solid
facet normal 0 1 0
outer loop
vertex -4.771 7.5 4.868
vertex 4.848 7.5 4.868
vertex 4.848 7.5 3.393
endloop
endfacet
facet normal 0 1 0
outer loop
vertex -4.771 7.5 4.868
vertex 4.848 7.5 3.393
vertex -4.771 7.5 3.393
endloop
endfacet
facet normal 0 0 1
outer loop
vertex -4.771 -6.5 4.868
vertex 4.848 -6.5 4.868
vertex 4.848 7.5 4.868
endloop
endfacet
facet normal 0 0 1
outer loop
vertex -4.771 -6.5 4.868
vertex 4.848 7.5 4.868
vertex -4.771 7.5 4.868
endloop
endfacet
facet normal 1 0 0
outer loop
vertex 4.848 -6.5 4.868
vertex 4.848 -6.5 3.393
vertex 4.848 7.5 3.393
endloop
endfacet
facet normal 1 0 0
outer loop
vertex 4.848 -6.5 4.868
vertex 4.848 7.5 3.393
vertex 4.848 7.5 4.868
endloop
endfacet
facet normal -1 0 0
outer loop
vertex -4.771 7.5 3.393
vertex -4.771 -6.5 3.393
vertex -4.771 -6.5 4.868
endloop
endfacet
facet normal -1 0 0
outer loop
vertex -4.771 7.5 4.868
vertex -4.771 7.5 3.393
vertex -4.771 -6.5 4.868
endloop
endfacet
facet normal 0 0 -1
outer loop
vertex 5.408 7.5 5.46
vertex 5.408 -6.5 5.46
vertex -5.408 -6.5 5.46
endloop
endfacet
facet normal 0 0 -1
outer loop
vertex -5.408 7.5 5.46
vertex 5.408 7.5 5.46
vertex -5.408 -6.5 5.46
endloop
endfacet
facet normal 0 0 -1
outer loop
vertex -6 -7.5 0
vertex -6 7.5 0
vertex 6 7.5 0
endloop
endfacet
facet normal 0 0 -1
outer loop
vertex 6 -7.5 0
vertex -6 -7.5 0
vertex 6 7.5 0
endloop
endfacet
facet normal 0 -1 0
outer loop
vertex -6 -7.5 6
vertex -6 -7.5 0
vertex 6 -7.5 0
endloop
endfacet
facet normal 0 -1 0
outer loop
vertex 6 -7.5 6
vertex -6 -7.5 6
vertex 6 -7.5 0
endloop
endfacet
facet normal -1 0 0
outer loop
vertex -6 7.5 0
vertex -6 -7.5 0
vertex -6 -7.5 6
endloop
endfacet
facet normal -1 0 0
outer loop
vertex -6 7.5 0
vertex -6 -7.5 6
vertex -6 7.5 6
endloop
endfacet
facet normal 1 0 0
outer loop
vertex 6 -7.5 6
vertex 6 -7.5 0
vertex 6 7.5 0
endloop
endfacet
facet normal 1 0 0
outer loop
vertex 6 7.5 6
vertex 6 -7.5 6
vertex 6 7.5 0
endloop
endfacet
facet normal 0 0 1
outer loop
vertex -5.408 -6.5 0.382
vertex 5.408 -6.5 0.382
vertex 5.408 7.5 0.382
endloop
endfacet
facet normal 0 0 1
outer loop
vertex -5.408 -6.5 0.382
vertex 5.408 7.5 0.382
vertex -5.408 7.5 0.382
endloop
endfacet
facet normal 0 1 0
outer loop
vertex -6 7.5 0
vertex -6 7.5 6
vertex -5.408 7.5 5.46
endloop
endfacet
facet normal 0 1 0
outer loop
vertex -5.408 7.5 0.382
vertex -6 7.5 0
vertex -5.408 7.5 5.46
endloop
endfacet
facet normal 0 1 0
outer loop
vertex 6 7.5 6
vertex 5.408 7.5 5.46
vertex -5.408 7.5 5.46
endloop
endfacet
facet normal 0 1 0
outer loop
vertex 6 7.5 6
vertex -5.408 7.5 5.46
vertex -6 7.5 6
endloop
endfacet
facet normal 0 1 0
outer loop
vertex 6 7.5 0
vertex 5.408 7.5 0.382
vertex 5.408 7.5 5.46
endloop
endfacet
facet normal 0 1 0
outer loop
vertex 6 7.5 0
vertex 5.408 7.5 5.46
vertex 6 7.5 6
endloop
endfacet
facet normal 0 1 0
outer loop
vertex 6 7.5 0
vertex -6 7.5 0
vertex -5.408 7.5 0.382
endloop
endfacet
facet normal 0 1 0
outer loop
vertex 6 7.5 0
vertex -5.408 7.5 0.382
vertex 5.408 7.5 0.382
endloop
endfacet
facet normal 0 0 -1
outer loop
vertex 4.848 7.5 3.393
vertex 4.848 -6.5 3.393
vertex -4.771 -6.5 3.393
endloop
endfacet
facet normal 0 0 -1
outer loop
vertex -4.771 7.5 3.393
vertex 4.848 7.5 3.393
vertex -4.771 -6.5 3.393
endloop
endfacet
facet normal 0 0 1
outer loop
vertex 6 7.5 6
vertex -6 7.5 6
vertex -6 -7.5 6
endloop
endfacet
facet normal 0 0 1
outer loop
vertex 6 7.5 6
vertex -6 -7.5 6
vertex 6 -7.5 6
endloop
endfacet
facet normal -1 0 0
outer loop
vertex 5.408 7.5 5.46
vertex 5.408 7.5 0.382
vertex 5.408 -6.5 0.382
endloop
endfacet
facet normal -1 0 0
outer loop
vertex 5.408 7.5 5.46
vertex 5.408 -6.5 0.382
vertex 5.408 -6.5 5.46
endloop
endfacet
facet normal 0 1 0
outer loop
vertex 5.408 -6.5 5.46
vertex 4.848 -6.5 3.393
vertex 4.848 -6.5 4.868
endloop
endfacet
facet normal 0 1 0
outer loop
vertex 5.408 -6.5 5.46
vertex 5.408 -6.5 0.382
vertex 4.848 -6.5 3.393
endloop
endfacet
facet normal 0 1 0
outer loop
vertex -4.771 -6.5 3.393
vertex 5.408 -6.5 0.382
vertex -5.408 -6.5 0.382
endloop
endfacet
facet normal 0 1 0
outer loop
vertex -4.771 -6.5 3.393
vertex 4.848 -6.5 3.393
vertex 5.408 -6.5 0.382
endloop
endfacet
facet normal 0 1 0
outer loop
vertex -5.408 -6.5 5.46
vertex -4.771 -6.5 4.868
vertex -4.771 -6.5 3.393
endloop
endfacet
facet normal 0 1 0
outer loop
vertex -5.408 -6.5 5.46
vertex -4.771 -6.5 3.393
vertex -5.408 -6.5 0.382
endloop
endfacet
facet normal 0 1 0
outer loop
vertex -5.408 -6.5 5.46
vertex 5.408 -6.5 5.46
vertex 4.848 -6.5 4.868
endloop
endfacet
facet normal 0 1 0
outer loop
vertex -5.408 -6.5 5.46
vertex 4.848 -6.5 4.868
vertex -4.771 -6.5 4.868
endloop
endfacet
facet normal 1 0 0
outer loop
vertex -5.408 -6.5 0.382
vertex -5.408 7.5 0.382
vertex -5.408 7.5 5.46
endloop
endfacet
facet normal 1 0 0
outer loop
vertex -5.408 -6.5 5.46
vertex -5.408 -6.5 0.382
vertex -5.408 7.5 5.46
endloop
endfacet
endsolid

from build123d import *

# Parameters (mm, degrees)
F0_W     = 12
F0_H     = 15
F1_DEPTH = 6
F2_W     = 10.816304
F2_H     = 5.077495
F3_DEPTH = 14
F4_W     = 9.618904
F4_H     = 1.474254
F5_DEPTH = 14


with BuildPart() as f1:
    # F0 (on Top) → F1 (new body)
    with BuildSketch(Plane.XY):
        Rectangle(F0_W, F0_H)
    extrude(amount=F1_DEPTH)

    # F2 (on face) → F3 (cut)
    with BuildSketch(Plane(origin=(0, 7.5, 0), x_dir=(-1, 0, 0), z_dir=(0, 1, 0))):
        with Locations((0, 2.921203)):
            Rectangle(F2_W, F2_H)
    extrude(amount=-F3_DEPTH, mode=Mode.SUBTRACT)

    # F4 (on face) → F5 (join)
    with BuildSketch(Plane(origin=(0, -6.5, 0), x_dir=(-1, 0, 0), z_dir=(0, 1, 0))):
        with Locations((-0.038077, 4.130425)):
            Rectangle(F4_W, F4_H)
    extrude(amount=F5_DEPTH)


solid = f1.part
